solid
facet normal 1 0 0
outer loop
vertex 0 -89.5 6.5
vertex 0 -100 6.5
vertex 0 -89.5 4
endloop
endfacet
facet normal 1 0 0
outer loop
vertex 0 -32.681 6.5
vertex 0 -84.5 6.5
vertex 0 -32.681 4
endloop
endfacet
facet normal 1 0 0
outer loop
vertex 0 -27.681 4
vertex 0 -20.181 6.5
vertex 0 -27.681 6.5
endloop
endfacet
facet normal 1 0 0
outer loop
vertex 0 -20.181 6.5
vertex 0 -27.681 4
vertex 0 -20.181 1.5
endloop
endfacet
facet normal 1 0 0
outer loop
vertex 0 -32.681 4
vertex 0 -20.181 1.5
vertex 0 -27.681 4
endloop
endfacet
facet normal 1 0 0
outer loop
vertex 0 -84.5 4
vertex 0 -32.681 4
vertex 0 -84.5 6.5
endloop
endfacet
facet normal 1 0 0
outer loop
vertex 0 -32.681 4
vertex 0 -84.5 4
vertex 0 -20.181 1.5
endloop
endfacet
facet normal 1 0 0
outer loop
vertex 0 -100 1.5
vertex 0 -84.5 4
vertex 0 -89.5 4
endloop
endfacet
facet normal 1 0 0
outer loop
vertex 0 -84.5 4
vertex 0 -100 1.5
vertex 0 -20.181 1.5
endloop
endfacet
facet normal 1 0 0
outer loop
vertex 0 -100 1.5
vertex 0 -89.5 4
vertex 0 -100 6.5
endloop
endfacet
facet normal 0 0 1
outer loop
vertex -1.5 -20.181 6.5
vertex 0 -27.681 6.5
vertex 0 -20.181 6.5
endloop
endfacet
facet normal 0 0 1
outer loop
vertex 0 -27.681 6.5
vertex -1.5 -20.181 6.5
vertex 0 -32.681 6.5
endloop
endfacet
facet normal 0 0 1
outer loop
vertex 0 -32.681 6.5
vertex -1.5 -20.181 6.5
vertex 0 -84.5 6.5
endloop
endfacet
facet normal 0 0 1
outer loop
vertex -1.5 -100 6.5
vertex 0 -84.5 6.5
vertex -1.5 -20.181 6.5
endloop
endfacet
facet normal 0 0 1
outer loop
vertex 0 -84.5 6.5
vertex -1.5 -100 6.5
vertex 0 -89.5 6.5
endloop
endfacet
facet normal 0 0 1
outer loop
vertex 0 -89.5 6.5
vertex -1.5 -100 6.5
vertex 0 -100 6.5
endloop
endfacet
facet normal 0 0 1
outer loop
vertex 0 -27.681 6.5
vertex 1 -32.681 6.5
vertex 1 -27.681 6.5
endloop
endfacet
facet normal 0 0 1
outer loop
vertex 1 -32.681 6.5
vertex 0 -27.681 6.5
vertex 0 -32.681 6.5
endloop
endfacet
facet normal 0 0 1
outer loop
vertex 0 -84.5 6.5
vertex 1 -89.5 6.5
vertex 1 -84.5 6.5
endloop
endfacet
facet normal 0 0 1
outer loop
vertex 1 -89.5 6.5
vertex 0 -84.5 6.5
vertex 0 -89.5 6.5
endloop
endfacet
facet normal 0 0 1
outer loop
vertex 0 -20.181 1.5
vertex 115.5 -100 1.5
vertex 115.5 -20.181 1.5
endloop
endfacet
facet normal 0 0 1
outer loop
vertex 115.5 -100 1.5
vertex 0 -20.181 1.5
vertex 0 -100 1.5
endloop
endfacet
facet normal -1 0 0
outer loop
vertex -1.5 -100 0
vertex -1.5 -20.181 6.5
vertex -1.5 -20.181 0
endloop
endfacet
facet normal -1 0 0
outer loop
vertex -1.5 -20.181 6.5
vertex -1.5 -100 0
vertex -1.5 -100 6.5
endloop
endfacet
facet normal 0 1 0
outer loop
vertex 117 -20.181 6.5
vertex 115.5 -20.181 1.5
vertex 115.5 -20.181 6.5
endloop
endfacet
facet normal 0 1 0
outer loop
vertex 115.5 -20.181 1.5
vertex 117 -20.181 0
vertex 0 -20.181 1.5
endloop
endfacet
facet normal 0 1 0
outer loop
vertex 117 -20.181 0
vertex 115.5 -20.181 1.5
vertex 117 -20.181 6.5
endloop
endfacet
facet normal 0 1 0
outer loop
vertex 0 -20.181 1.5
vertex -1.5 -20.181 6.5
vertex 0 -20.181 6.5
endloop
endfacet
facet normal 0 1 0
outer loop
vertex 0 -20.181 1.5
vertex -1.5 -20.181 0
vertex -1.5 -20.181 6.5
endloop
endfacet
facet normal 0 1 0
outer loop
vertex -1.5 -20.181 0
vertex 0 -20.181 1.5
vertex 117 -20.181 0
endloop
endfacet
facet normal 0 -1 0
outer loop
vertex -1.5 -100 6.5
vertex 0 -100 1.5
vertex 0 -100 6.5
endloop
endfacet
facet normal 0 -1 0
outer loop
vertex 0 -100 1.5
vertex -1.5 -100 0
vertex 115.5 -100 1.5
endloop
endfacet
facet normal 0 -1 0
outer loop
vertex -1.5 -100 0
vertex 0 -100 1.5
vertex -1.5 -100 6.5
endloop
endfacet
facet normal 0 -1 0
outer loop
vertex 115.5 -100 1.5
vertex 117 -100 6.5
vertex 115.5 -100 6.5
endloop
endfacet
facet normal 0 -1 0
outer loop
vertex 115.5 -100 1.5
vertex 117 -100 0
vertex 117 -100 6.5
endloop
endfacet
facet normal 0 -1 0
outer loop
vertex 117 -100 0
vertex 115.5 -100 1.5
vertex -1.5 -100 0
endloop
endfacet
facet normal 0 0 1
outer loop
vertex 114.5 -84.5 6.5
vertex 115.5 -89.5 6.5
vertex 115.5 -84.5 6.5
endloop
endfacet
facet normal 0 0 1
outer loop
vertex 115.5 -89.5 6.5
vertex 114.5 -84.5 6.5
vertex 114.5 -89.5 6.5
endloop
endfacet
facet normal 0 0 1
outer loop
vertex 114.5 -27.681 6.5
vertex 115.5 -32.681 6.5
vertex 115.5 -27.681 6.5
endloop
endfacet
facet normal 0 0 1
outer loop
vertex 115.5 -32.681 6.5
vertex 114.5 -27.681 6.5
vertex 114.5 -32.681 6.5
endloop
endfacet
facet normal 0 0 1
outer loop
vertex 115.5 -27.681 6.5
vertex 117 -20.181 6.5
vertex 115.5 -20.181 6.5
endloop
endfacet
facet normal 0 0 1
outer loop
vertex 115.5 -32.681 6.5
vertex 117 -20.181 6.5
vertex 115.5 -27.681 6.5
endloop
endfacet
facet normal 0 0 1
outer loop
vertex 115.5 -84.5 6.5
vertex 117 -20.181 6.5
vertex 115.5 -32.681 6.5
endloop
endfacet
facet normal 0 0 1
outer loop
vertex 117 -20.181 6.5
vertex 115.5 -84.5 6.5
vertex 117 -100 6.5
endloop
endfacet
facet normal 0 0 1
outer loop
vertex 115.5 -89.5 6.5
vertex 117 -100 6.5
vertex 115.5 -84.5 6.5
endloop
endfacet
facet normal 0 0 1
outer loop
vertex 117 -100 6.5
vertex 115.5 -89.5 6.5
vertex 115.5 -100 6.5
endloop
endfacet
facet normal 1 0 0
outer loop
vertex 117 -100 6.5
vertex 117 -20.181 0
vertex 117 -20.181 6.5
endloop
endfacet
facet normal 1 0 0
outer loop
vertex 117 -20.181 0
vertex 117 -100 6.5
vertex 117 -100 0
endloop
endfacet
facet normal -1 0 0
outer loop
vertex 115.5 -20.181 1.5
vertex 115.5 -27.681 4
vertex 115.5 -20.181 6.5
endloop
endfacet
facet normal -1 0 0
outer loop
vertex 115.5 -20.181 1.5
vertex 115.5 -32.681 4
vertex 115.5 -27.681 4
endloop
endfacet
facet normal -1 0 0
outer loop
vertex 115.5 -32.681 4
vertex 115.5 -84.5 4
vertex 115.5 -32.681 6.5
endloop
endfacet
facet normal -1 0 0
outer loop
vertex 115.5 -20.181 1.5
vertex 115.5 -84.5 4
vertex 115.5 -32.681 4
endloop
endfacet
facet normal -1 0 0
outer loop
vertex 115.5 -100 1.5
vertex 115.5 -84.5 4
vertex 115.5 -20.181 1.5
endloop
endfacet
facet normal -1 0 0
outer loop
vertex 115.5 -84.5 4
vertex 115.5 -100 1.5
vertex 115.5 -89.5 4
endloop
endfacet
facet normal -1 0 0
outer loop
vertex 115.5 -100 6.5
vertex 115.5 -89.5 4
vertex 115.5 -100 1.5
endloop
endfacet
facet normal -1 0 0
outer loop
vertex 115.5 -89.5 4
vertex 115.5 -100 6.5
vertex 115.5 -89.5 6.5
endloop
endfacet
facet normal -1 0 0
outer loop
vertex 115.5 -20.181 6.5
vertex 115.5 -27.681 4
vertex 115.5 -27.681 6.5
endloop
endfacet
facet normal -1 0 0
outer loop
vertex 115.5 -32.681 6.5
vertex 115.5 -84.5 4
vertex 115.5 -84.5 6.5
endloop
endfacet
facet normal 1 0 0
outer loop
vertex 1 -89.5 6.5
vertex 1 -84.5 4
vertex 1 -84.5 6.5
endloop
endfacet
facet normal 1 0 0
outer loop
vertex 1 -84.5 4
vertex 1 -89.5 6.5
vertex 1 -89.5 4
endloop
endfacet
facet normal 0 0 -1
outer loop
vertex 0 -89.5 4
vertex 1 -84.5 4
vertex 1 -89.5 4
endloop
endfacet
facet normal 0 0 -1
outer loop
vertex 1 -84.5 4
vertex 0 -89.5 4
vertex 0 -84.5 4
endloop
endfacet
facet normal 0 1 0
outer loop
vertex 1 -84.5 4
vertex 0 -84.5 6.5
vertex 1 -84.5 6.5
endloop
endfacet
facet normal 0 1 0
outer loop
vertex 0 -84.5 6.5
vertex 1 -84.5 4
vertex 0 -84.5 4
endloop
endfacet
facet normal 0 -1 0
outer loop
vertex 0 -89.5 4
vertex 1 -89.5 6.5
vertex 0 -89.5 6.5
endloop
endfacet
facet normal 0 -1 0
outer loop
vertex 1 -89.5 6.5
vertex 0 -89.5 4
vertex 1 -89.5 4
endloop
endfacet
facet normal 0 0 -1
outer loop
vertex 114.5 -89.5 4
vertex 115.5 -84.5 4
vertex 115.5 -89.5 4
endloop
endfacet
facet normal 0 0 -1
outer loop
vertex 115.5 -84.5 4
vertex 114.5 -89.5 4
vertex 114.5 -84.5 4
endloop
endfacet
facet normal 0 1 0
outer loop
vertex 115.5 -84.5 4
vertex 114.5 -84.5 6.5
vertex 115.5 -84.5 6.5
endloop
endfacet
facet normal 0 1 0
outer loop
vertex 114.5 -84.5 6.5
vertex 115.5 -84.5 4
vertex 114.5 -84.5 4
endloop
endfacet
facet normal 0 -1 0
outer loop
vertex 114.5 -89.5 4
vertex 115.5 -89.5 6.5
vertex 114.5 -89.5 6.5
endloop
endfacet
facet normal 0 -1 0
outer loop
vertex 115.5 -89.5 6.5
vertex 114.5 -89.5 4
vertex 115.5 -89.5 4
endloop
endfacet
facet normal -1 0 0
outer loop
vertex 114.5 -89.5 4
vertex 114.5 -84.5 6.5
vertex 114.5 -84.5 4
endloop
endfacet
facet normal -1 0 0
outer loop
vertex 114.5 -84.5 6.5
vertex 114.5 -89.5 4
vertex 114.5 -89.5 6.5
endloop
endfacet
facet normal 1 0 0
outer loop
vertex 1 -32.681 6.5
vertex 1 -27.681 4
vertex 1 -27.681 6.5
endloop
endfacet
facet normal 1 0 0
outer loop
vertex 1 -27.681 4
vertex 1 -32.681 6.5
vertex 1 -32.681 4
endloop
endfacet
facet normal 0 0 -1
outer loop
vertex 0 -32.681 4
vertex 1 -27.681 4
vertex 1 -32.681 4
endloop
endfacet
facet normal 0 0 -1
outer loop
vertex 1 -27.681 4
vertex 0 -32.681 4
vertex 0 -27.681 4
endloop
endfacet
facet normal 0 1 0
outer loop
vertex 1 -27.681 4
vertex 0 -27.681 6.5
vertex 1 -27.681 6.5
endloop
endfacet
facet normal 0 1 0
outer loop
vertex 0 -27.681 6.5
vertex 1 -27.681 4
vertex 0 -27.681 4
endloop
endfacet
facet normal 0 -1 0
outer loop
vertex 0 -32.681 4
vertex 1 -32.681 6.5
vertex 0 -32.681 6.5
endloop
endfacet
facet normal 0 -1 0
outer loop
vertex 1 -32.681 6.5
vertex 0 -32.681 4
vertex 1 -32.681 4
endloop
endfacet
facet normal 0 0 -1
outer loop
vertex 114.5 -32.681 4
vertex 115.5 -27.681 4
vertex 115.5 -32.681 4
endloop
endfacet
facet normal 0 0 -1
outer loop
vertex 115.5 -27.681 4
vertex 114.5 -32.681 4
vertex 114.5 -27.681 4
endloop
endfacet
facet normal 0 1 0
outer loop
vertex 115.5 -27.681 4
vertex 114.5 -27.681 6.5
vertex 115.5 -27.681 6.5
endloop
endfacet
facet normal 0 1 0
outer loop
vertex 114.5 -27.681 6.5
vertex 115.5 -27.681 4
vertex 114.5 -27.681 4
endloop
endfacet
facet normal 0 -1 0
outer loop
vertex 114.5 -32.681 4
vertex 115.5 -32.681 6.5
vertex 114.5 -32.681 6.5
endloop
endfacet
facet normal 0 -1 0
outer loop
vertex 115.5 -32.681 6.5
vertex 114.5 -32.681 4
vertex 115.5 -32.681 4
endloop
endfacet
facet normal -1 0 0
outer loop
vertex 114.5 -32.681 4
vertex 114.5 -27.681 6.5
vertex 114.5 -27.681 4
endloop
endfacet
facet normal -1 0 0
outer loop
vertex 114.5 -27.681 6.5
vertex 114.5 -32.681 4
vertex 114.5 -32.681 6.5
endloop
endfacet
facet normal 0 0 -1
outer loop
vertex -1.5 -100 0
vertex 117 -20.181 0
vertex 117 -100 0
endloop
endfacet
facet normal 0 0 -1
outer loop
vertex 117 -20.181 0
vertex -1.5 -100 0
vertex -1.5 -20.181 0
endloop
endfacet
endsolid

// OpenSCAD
/* = 500w spindle case
 * parts: case + lid
 * units: mm
 *
 * * * * *
 *
 * Designed by Daniel Oaks <https://danieloaks.net>.
 *
 * To the extent possible under law, the person who associated CC0 with
 * this file and design has waived all copyright and related or
 * neighboring rights to this file and design.
 * You should have received a copy of the CC0 legalcode along with this
 * work.  If not, see <http://creativecommons.org/publicdomain/zero/1.0/>.
 *
 * * * * *
 *
 *  I got a 500w spindle for my 3018, and needed a case for it.
 *
 * * * * */
 
// part to make
Part = "Lid"; // [Case, Lid]

// mm, width of the walls
WallWidth = 1.5;

// mm, height of any lips
LipHeight = 1.5;

// mm, Width is the side with the screw connectors.
PSUWidth = 108.5 + 4;
PSUDepth = 140.5 + 1;
PSUHeight = 50.5 + 0.5;

// mm, how much empty space at the front of the enclosure
EmptySpace = 105;

// degrees, the angle of the front panel from vertical
FrontPanelAngle = 25;

// mm, size of the hole in the front panel
FrontPanelHoleWidth = 48;
FrontPanelHoleHeight = 28.5;

// mm, location of the hole in the front panel
FrontPanelHoleX = 45;
FrontPanelHoleZ = 20;

// mm, diameter of the cable ports in the side
CablePort1Diameter = 18;
CablePort2Diameter = 15;

// mm, diameter of the ground screw cutout
// and x,z relative to the far bottom corner
// of the PSU
GroundScrewDiameter = 8;
GroundScrewX = 6;
GroundScrewZ = 40.5;

// mm, lil standoff for the pwm board. this
// should be a decent press fit. insets are how
// much of the corner we can have spacers take up.
PwmBoardWidth = 34.5;
PwmBoardLength = 34.5;
PwmBoardCornerInsets = 4;
PwmBoardX = 15;
PwmBoardY = 35;

/// calculated
TotalWidth = PSUWidth + WallWidth*2;
RoughFrontSpaceWithoutAngle = (PSUHeight + WallWidth * 2) / tan(90 - FrontPanelAngle);

module copy_mirror(vec=[0,0,0], offset=[0,0,0])
{
    children();
    translate(offset) mirror(vec) children();
}

if (Part == "Lid") {
    // lid
    //translate([0, 100 + RoughFrontSpaceWithoutAngle, PSUHeight + 10]) rotate([0,180,0])
    translate([TotalWidth/2,0,0])
    translate([0,-100,0]) {
        // core shape
        translate([-WallWidth - TotalWidth/2,0,0]) cube([TotalWidth + WallWidth*2, EmptySpace - RoughFrontSpaceWithoutAngle, WallWidth]);
        
        // walls
        copy_mirror([1,0,0]) translate([-WallWidth - TotalWidth/2, 0, WallWidth]) cube([WallWidth, EmptySpace - RoughFrontSpaceWithoutAngle, 5]);
        
        // tabs
        copy_mirror([1,0,0]) translate([-WallWidth - TotalWidth/2, 10.5, WallWidth + 2.5]) cube([2.5, 5, 2.5]);
        copy_mirror([1,0,0]) translate([-WallWidth - TotalWidth/2, EmptySpace - RoughFrontSpaceWithoutAngle - 12.5, WallWidth + 2.5]) cube([2.5, 5, 2.5]);
    }
}

if (Part == "Case") { 
    // main body
    difference() {
        // core shape
        cube([TotalWidth, PSUDepth + WallWidth + EmptySpace, PSUHeight + WallWidth*2]);
        
        // hollow out insides
        translate([WallWidth, WallWidth, WallWidth]) cube([PSUWidth, PSUDepth + EmptySpace, PSUHeight]);
     
        // PSU cutout
        translate([-1, EmptySpace + WallWidth, WallWidth]) cube([PSUWidth + WallWidth + 1, PSUDepth + 1, PSUHeight + WallWidth + 1]);
        
        // front panel cutout
        rotate([- FrontPanelAngle,0,0]) translate([-1,-PSUHeight + WallWidth,0]) cube([PSUWidth + 8,PSUHeight,PSUHeight * 3]);

        // m3 screw holes
        translate([40.8,83.7 + EmptySpace,0]) cylinder(WallWidth*3, d=4, center=true);
        translate([72.7,83.7 + EmptySpace,0]) cylinder(WallWidth*3, d=4, center=true);
        
        // cable ports in side
        translate([0,EmptySpace - CablePort1Diameter/2 - 25,(PSUHeight + WallWidth*2)/2 + 10]) rotate([0,90,0]) cylinder(WallWidth*3, d=CablePort1Diameter, center=true);

        translate([0,EmptySpace - CablePort2Diameter/2 - 55,(PSUHeight + WallWidth*2)/2 - 12]) rotate([0,90,0]) cylinder(WallWidth*3, d=CablePort2Diameter, center=true);

        // ground screw cutout
        translate([WallWidth+PSUWidth, EmptySpace+WallWidth + GroundScrewX, WallWidth + GroundScrewZ]) rotate([0,90,0]) cylinder(WallWidth*3, d=GroundScrewDiameter, center=true);

        // open lid on the empty space
        translate([TotalWidth/2, EmptySpace/2 + WallWidth + RoughFrontSpaceWithoutAngle, WallWidth + PSUHeight]) cube([PSUWidth, EmptySpace, WallWidth*3], center=true);

        // snap-fit holes for lid
        translate([WallWidth + PSUWidth/2, EmptySpace - 13, WallWidth+PSUHeight - 5]) copy_mirror([1,0,0]) translate([-PSUWidth/2 - WallWidth - 0.5,0,0]) cube([3, 6, 3]);
        translate([WallWidth + PSUWidth/2, RoughFrontSpaceWithoutAngle + 10, WallWidth+PSUHeight - 5]) copy_mirror([1,0,0]) translate([-PSUWidth/2 - WallWidth - 0.5,0,0]) cube([3, 6, 3]);
    }


    // inner chamfer at front
    difference() {
        cube([TotalWidth, WallWidth*2, PSUHeight]);

        // front panel cutout
        rotate([- FrontPanelAngle,0,0]) translate([-1,-PSUHeight + WallWidth,0]) cube([PSUWidth + 8,PSUHeight,PSUHeight * 3]);
    }

    // inner chamfer on sides
    intersection() {
        translate([TotalWidth/2,0,0]) copy_mirror([1,0,0]) translate([- TotalWidth/2,0,0]) rotate([0,45,0]) translate([WallWidth, (EmptySpace + WallWidth) / 2, WallWidth]) cube([WallWidth * 10, EmptySpace + WallWidth, WallWidth*2.1], center = true);
        
        // hollow out insides
        translate([WallWidth, WallWidth, WallWidth]) cube([PSUWidth, EmptySpace, PSUHeight]);
    }

    // pwm board holder
    translate([PwmBoardWidth/2 + WallWidth + PwmBoardX, PwmBoardLength/2 + WallWidth + PwmBoardY, WallWidth]) {
        copy_mirror([0,1,0]) copy_mirror([1,0,0]) translate([- PwmBoardWidth/2 + PwmBoardCornerInsets/2, - PwmBoardLength/2 + PwmBoardCornerInsets/2, 0]) cube([PwmBoardCornerInsets, PwmBoardCornerInsets, WallWidth], center=true);
        copy_mirror([0,1,0]) translate([0,- PwmBoardLength/2 - WallWidth/2,1.5/2]) cube([PwmBoardWidth + WallWidth*2, WallWidth, WallWidth + 1.5], center=true);
        copy_mirror([1,0,0]) rotate([0,0,90]) translate([0,- PwmBoardWidth/2 - WallWidth/2,1.5/2]) cube([PwmBoardLength + WallWidth*2, WallWidth, WallWidth + 1.5], center=true);
    }
        
    // psu stopping lip
    translate([0, EmptySpace, WallWidth]) cube([TotalWidth, WallWidth, LipHeight]);
    translate([PSUWidth + (WallWidth - LipHeight), EmptySpace, 0]) cube([LipHeight, WallWidth, PSUHeight + WallWidth]);
    translate([0, EmptySpace + WallWidth, WallWidth]) cube([WallWidth, PSUDepth, LipHeight]);

    // psu lip at end
    translate([0, EmptySpace + WallWidth + PSUDepth, 0]) cube([TotalWidth, WallWidth, WallWidth + LipHeight]);
    translate([PSUWidth + (WallWidth - LipHeight), EmptySpace + WallWidth + PSUDepth, 0]) cube([LipHeight + WallWidth, WallWidth, PSUHeight + WallWidth*2]);

    // front panel
    difference() {
        intersection() {
            // core shape
            cube([TotalWidth, PSUDepth + WallWidth + EmptySpace, PSUHeight + WallWidth*2]);

            // front panel cutout
            rotate([- FrontPanelAngle,0,0]) translate([-1,-PSUHeight + WallWidth,0]) cube([PSUWidth + 8,PSUHeight,PSUHeight * 3]);
        }

        intersection() {
            // core shape
            translate([-1,-1,-1]) cube([TotalWidth + 2, PSUDepth + WallWidth + EmptySpace + 2, PSUHeight + WallWidth*2 + 2]);

            // front panel cutout
            rotate([- FrontPanelAngle,0,0]) translate([-1,-PSUHeight,0]) cube([PSUWidth + 8,PSUHeight,PSUHeight * 3]);
        }
        
        // front panel hole
        rotate([- FrontPanelAngle,0,0]) translate([FrontPanelHoleX, -1, FrontPanelHoleZ]) cube([FrontPanelHoleWidth, 200, FrontPanelHoleHeight]);
    }
}
